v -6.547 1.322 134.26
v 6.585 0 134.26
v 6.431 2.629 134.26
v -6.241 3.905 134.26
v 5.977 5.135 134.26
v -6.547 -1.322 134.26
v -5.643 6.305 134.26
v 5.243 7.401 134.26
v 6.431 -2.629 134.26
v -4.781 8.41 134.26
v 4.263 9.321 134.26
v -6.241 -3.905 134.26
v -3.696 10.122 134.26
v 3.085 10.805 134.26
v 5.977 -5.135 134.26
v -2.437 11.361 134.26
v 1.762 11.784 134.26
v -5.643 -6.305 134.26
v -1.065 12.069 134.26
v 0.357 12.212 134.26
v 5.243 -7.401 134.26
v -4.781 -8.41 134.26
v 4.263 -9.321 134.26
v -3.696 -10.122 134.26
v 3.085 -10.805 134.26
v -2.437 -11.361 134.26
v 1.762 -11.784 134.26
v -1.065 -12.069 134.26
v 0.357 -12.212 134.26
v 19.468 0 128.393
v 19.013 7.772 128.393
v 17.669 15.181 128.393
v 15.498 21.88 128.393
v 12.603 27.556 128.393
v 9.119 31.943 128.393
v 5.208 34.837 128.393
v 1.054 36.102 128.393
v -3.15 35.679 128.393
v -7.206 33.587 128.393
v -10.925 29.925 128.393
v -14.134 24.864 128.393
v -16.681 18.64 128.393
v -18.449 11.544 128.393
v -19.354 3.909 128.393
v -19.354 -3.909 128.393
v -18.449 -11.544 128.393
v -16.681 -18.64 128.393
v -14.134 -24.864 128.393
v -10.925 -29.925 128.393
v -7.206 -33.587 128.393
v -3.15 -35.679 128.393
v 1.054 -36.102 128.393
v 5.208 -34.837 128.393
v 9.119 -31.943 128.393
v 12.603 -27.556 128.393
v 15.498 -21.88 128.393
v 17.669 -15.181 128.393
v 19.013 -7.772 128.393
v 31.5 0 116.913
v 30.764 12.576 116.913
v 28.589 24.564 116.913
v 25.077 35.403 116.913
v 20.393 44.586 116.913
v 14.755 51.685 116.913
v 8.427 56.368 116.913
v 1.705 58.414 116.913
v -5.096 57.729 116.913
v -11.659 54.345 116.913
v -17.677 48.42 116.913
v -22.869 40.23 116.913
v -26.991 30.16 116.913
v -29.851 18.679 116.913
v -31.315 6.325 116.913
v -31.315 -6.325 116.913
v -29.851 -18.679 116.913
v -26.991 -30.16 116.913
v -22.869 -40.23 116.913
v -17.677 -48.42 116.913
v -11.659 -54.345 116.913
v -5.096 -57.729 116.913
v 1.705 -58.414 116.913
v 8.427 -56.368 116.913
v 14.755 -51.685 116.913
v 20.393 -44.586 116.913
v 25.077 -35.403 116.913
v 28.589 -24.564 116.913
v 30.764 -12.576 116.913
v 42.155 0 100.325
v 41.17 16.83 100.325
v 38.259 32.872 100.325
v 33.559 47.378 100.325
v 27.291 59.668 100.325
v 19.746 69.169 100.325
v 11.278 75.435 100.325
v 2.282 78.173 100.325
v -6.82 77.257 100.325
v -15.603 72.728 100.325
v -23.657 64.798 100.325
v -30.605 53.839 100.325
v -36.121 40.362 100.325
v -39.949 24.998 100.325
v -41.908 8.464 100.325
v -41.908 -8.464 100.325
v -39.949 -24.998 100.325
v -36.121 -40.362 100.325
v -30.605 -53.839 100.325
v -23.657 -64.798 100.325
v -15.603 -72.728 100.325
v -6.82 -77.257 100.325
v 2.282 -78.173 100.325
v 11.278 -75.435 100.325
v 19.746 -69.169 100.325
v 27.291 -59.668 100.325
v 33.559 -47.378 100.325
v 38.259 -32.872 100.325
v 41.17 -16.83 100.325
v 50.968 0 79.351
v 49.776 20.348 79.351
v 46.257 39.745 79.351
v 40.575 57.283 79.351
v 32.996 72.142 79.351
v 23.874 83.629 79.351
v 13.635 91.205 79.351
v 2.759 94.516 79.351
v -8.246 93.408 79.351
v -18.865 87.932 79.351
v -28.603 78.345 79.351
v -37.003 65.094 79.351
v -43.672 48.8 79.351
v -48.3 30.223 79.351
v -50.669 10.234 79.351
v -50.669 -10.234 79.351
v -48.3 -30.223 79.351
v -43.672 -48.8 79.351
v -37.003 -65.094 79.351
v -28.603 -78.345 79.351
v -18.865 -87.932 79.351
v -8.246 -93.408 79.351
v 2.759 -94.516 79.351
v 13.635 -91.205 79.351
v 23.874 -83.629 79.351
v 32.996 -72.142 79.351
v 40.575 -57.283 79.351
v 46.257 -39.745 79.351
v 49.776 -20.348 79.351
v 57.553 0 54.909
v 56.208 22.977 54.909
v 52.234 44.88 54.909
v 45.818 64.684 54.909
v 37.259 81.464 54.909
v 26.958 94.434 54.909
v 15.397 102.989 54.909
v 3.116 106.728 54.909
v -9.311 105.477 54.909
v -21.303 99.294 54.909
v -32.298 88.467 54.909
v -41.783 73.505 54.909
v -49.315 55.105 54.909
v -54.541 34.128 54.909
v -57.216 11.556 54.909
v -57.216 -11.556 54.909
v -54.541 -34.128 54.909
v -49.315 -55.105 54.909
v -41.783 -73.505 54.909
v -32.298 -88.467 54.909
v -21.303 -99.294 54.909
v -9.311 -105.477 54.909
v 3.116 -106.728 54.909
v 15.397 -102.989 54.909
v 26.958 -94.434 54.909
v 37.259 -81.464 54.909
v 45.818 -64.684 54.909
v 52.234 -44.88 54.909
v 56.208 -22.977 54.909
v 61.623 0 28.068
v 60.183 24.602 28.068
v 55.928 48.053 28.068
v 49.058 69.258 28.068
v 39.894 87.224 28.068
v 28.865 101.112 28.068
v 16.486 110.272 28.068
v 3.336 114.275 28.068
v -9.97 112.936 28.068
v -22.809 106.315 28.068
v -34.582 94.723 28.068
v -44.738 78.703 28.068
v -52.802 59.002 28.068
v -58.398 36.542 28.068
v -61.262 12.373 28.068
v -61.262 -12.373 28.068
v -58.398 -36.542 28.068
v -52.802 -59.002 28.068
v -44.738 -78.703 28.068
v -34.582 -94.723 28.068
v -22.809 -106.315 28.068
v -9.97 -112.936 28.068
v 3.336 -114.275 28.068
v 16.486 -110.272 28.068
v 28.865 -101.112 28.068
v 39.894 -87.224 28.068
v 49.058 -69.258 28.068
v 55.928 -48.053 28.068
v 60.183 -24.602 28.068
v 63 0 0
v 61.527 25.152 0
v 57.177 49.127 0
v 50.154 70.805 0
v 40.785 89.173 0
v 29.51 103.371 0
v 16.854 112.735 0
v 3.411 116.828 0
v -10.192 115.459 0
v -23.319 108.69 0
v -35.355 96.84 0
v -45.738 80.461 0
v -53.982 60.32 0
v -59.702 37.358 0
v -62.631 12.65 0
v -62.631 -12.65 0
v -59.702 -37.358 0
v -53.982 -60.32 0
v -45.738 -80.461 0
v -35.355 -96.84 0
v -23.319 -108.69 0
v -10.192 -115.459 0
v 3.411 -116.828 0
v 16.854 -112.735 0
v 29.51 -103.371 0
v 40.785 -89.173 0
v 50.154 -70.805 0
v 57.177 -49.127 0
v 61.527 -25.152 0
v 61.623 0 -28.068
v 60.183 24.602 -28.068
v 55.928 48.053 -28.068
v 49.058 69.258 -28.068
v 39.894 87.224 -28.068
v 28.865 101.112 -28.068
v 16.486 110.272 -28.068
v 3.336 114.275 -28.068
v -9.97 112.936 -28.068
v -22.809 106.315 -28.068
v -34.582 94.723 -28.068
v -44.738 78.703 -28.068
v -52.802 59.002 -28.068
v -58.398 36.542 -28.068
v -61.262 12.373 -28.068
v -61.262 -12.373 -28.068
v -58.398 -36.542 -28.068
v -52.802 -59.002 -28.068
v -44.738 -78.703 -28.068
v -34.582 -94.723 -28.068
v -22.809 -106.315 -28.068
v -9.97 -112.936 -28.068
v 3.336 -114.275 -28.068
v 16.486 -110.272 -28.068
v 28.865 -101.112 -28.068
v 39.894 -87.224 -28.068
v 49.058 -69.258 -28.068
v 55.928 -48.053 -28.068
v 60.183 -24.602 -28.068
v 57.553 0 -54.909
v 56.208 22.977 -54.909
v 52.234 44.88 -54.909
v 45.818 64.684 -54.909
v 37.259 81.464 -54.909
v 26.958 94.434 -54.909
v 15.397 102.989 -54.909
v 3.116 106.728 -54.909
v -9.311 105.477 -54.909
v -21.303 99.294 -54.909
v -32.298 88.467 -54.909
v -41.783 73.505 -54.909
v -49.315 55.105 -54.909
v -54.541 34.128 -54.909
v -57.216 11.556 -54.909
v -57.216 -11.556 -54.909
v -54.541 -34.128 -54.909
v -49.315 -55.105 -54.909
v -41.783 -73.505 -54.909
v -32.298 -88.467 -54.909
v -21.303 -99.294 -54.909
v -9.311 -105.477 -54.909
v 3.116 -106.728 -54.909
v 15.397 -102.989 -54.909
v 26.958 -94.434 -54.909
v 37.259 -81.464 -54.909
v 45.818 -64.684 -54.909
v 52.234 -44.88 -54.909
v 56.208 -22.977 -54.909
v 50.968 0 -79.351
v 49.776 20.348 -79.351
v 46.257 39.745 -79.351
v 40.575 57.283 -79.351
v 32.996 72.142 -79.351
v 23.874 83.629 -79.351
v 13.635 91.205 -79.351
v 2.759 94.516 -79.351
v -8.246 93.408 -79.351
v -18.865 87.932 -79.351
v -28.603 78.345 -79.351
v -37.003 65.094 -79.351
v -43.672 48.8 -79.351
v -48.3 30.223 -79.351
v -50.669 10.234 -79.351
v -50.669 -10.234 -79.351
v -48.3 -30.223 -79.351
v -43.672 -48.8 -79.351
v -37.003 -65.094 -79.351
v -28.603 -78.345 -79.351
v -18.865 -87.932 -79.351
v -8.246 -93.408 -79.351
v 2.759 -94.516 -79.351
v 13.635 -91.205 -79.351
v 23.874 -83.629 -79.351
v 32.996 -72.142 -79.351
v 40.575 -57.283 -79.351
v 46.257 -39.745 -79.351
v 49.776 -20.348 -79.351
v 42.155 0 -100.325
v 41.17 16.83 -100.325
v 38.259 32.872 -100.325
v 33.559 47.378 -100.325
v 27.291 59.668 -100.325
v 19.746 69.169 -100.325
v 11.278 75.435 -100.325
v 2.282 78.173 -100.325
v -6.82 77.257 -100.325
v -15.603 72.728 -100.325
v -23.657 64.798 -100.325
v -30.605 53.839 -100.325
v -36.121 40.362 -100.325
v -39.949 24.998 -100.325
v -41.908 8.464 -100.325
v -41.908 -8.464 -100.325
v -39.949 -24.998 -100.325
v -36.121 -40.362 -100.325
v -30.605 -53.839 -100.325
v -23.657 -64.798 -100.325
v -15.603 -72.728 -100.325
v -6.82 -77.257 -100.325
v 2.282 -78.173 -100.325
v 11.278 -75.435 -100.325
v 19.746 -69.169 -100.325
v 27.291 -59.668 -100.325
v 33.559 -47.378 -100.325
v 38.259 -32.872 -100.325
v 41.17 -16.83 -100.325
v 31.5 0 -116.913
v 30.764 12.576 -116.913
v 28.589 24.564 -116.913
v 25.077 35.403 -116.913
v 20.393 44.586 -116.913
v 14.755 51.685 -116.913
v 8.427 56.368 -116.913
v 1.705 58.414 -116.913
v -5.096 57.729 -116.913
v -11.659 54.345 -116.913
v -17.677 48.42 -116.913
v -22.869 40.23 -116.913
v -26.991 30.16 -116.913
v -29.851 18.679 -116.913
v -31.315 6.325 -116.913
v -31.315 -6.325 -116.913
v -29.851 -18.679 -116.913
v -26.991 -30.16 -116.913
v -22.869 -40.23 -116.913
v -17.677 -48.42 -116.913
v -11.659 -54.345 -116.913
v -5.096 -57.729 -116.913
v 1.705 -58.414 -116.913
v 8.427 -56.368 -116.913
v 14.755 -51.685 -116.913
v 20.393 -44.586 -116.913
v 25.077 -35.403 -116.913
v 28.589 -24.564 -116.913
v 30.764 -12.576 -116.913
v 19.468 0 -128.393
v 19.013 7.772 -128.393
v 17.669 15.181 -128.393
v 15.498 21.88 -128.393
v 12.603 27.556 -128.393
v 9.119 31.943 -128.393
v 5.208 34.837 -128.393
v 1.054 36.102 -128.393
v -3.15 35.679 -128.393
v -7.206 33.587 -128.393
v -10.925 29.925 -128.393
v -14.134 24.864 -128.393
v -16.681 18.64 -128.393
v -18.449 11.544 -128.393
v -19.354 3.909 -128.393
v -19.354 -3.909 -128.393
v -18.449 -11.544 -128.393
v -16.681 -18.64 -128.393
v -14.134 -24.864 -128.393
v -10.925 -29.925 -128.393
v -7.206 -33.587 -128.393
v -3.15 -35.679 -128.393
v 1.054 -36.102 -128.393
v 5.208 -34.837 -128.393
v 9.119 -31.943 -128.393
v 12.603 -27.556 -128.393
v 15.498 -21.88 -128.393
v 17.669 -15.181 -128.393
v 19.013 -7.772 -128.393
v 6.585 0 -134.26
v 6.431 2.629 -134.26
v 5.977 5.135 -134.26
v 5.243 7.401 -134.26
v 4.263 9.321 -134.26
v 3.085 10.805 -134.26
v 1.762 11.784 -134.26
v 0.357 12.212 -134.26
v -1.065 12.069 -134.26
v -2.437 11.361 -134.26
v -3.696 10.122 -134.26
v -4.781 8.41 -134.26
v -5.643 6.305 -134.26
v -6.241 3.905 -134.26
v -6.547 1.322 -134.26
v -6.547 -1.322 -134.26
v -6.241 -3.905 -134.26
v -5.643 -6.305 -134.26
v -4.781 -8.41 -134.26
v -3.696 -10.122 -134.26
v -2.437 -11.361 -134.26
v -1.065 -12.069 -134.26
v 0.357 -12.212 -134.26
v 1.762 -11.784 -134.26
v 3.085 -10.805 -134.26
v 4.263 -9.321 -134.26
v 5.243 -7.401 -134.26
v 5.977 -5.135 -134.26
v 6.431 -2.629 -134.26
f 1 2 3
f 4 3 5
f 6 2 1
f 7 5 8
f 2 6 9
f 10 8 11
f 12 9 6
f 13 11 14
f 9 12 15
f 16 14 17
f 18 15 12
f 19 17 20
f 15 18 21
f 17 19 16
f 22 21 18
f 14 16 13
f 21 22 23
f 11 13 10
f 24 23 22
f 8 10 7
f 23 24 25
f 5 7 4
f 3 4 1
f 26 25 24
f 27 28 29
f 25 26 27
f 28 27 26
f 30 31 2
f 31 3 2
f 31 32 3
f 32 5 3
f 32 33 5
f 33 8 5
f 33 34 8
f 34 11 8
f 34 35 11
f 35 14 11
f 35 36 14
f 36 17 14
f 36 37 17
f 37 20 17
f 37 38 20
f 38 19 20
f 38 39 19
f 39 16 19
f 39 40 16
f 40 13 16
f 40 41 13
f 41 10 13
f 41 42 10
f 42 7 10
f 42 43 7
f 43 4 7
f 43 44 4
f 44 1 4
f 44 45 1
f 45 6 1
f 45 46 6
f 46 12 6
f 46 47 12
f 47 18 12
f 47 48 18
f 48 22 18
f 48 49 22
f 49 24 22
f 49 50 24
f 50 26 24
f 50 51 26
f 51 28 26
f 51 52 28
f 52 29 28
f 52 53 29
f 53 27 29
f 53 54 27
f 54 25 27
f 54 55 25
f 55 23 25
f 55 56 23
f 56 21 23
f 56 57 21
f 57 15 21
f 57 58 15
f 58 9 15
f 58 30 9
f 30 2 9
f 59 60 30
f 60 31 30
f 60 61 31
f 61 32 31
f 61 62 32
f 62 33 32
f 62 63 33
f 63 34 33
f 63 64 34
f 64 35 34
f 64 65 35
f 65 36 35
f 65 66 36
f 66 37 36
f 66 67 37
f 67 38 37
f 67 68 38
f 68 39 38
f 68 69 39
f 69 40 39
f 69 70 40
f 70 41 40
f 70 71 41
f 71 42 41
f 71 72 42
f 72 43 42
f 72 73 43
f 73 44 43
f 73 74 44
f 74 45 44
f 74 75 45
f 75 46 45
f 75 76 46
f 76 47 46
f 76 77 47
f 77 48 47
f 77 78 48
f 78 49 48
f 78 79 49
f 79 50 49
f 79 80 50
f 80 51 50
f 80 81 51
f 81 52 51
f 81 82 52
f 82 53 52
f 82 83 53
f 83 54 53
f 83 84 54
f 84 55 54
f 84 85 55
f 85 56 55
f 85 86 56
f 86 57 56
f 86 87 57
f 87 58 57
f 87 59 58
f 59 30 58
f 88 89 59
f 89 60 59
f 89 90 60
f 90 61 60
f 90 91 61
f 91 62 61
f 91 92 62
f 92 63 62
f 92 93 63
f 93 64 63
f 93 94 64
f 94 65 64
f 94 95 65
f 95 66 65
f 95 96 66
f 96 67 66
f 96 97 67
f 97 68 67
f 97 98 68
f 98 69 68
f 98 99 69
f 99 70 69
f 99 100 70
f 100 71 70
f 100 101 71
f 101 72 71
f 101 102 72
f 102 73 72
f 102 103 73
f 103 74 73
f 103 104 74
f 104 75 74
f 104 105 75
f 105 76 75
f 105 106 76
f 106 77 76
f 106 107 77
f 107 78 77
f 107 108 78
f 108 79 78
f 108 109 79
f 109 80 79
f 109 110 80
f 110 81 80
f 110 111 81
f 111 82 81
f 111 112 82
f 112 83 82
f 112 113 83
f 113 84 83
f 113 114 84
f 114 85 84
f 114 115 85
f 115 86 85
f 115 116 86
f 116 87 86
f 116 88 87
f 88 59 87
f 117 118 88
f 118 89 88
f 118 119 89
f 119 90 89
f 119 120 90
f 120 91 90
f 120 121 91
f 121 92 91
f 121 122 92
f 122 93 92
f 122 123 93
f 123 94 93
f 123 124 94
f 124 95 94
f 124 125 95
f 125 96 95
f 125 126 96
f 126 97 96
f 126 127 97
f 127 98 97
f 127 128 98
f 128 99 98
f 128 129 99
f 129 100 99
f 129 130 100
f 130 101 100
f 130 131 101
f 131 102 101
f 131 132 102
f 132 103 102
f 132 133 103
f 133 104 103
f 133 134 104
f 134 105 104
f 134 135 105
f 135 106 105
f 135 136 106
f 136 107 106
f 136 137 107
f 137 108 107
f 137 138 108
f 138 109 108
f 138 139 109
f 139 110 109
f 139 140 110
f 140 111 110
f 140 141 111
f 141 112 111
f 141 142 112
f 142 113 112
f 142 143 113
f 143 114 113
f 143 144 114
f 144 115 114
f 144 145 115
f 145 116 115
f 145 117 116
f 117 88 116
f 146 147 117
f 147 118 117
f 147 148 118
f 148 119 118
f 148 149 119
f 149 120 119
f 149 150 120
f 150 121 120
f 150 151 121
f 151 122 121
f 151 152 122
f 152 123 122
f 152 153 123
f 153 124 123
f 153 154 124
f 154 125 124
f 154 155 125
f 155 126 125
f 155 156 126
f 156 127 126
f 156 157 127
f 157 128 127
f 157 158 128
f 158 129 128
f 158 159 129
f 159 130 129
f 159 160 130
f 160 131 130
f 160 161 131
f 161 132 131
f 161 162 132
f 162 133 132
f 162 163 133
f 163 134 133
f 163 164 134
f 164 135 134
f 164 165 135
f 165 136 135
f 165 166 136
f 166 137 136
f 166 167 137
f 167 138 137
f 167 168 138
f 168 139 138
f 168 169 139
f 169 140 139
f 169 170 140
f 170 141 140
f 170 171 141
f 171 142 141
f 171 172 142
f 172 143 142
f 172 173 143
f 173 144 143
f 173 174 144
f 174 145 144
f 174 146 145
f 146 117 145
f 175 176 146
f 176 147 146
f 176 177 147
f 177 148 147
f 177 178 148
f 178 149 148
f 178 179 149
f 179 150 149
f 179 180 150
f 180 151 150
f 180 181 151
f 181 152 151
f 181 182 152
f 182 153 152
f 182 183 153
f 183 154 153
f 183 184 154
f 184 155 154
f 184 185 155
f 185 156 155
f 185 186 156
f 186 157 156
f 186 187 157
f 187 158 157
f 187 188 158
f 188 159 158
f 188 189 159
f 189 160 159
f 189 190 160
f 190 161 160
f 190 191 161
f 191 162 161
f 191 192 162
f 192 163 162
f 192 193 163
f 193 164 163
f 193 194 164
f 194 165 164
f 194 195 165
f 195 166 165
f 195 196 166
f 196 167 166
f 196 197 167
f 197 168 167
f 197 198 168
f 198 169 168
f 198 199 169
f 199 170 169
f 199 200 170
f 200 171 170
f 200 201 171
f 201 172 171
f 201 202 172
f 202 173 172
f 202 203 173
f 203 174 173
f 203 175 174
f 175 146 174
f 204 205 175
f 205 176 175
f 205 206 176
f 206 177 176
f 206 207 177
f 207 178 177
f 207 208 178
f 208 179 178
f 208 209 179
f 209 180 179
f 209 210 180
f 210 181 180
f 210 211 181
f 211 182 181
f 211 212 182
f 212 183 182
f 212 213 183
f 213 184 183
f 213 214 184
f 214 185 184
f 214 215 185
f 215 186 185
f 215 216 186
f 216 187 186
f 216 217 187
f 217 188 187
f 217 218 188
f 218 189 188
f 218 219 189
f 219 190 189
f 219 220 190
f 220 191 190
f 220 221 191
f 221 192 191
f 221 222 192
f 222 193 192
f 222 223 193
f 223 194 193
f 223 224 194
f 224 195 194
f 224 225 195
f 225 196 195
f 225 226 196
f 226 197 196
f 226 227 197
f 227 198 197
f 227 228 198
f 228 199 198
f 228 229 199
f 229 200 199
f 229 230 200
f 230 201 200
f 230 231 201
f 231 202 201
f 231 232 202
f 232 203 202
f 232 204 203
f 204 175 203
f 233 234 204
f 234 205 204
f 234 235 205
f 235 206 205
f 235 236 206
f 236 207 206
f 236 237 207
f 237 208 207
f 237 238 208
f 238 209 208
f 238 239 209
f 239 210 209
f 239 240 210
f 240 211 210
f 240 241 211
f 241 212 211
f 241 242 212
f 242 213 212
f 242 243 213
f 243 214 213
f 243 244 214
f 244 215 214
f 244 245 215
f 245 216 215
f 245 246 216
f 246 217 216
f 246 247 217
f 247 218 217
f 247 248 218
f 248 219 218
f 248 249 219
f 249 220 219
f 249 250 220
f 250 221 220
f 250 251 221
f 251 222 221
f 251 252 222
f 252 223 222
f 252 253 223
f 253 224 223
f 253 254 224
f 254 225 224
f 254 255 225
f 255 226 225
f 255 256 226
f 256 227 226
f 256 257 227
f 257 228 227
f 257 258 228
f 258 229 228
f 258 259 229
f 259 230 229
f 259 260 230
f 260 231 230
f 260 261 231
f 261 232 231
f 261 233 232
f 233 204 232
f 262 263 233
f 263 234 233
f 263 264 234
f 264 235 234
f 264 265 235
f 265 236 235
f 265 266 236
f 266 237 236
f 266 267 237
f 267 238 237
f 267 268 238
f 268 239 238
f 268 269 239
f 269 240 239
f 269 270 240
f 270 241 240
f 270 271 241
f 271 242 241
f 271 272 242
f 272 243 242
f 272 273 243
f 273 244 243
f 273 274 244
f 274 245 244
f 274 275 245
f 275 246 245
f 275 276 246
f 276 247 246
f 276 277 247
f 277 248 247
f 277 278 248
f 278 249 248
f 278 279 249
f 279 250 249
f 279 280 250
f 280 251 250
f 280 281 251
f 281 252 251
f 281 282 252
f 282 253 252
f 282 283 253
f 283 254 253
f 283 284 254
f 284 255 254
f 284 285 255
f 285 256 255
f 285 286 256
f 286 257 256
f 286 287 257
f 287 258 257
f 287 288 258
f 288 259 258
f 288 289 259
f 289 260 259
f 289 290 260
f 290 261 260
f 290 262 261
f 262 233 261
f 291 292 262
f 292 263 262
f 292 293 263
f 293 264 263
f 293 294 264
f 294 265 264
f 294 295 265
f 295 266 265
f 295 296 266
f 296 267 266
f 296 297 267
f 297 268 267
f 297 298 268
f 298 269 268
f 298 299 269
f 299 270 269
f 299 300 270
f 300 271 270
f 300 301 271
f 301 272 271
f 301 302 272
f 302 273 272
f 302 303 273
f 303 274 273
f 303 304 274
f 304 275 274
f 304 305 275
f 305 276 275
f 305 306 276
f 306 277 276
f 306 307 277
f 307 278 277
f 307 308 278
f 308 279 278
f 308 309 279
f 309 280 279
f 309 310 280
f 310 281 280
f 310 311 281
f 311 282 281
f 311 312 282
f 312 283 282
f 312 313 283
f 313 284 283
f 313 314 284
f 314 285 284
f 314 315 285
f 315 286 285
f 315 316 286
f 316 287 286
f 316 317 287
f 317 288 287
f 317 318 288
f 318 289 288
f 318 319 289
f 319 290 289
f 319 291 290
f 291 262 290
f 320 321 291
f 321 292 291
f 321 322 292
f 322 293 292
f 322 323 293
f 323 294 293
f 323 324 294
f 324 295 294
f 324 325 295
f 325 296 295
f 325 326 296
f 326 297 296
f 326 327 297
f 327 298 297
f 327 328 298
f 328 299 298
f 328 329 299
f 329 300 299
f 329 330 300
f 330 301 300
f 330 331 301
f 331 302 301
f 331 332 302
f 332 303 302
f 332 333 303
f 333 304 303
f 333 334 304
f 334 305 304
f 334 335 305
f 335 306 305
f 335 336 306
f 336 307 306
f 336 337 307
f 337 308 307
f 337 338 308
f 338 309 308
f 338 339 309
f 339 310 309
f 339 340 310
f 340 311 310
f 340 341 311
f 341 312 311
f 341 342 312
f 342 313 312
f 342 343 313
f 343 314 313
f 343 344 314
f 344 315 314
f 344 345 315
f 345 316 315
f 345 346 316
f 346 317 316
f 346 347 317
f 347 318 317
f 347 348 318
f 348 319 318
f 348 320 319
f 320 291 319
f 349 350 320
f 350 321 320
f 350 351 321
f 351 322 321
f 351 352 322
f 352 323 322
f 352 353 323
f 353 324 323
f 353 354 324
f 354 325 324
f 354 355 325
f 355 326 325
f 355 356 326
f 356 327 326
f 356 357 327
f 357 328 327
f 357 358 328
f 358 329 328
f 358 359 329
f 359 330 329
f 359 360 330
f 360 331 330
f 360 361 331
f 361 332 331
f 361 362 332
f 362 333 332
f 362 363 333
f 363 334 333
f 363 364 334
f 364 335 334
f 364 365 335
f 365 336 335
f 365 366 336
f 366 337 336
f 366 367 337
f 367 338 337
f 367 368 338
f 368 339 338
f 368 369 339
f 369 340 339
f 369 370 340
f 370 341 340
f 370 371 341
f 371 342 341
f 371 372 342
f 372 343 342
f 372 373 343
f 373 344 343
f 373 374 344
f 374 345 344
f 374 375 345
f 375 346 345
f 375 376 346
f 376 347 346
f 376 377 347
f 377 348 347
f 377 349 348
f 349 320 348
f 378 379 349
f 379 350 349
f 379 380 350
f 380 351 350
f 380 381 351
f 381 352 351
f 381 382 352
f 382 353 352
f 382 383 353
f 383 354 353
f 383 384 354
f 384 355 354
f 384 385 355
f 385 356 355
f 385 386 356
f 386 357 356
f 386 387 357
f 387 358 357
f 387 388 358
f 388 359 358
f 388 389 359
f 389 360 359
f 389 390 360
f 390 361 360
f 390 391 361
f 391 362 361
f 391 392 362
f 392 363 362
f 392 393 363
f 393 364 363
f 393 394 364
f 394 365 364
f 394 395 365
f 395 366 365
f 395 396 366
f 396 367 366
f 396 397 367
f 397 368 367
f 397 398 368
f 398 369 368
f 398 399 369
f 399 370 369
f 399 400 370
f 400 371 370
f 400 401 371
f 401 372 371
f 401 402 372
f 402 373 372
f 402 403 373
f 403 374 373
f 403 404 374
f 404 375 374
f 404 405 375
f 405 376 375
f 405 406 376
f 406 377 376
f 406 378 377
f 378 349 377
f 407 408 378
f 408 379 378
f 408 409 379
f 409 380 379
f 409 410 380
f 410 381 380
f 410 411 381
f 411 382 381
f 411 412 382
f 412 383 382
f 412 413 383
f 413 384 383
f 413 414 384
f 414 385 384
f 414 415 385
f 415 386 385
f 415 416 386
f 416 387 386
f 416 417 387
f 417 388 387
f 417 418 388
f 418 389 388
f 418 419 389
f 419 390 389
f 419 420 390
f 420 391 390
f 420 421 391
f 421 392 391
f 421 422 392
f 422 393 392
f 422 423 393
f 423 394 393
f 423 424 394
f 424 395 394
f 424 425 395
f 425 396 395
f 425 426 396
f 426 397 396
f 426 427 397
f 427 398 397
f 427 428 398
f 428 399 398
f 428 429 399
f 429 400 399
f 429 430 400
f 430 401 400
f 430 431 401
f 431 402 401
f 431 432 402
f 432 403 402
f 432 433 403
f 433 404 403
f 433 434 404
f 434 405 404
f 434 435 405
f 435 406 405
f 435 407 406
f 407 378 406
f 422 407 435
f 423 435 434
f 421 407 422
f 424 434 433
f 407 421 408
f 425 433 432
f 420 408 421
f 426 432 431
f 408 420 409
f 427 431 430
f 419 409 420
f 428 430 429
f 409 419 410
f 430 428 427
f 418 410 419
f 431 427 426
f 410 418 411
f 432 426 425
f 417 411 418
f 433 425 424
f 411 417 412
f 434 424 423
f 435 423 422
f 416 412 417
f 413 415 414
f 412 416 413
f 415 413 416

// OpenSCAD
// Generated by SolidPython 1.0.1 on 2020-07-29 00:46:47


scale(v = [7, 13, 15]) {
	sphere(r = 9);
}
/***********************************************
*********      SolidPython code:      **********
************************************************
 
# import packages: SolidPython
from solid import *
from solid.utils import *
from itertools import chain, combinations, permutations


class Resize:

    def __init__(self, scad_file):
        self.scad_file = scad_file
        #self.scad_file = import_scad(scad_file)
        # cone/cylinder param:
        self.r1 = 0
        self.r2 = 0
        self.h = 0
        # rectangular prism param:
        self.w = 0
        self.l = 0
        # ellipse param:
        self.r = 0

    # import OpenScad code (file name corresponds to shape)


    # classify shape + parameters
    def assign(self, param1, param2, param3):
        if self.scad_file == 'cone.scad':
            self.r1 = param1
            self.r2 = param2
            self.h = param3
        elif self.scad_file == 'cylinder.scad':
            self.r1 = param1
            self.r2 = param2
            self.h = param3
        elif self.scad_file == 'rectangularPrism.scad':
            self.h = param1
            self.l = param2
            self.w = param3
        else:
            self.r = param1
            self.h = param2

    # resize parameters
    def iterate(self):
        x = range(3, 20, 2)
        i = 1
        if self.scad_file == 'cone.scad':
            tempList = list(permutations(x, 2))
            for temp in tempList:
                param1 = temp[0]
                param2 = temp[1]
                filepath = 'produced_scad_files/' + 'cone' + str(param1) + '_' + str(param2) + '_' + '.scad'
                scad_render_to_file(cylinder(h=param1, r1=param2, r2=0), filepath)

        elif self.scad_file == 'cylinder.scad':
            tempList = list(permutations(x, 3))
            for temp in tempList:
                param1 = temp[0]
                param2 = temp[1]
                filepath = 'produced_scad_files/' + 'cylinder' + str(param1) + '_' + str(param2) + '_' + '.scad'
                scad_render_to_file(cylinder(h=param1, r1=param2, r2=param2), filepath)

        elif self.scad_file == 'rectangularPrism.scad':
            tempList = list(permutations(x, 3))
            for temp in tempList:
                param1 = temp[0]
                param2 = temp[1]
                param3 = temp[2]
                filepath = 'produced_scad_files/' + 'rectangularPrism' + str(param1) + '_' + str(param2) + '_' + str(
                    param3) + '.scad'
                scad_render_to_file(cube(size=(param1, param2, param3)), filepath)

        elif self.scad_file == 'ellipse.scad':
            tempList = list(permutations(x, 4))
            for temp in tempList:
                param1 = temp[0]
                param2 = temp[1]
                param3 = temp[2]
                param4 = temp[3]
                filepath = 'produced_scad_files/' + 'ellipse' + str(param1) + '_' + str(param2) + '_' + str(param3) + '_' + str(param4) + '.scad'
                scad_render_to_file(scale([param1, param2, param3])(sphere(r=param4)), filepath)

    def render_to_scadfile(self):
        scad_render_to_file(scad, 'example.scad') 
 
************************************************/
